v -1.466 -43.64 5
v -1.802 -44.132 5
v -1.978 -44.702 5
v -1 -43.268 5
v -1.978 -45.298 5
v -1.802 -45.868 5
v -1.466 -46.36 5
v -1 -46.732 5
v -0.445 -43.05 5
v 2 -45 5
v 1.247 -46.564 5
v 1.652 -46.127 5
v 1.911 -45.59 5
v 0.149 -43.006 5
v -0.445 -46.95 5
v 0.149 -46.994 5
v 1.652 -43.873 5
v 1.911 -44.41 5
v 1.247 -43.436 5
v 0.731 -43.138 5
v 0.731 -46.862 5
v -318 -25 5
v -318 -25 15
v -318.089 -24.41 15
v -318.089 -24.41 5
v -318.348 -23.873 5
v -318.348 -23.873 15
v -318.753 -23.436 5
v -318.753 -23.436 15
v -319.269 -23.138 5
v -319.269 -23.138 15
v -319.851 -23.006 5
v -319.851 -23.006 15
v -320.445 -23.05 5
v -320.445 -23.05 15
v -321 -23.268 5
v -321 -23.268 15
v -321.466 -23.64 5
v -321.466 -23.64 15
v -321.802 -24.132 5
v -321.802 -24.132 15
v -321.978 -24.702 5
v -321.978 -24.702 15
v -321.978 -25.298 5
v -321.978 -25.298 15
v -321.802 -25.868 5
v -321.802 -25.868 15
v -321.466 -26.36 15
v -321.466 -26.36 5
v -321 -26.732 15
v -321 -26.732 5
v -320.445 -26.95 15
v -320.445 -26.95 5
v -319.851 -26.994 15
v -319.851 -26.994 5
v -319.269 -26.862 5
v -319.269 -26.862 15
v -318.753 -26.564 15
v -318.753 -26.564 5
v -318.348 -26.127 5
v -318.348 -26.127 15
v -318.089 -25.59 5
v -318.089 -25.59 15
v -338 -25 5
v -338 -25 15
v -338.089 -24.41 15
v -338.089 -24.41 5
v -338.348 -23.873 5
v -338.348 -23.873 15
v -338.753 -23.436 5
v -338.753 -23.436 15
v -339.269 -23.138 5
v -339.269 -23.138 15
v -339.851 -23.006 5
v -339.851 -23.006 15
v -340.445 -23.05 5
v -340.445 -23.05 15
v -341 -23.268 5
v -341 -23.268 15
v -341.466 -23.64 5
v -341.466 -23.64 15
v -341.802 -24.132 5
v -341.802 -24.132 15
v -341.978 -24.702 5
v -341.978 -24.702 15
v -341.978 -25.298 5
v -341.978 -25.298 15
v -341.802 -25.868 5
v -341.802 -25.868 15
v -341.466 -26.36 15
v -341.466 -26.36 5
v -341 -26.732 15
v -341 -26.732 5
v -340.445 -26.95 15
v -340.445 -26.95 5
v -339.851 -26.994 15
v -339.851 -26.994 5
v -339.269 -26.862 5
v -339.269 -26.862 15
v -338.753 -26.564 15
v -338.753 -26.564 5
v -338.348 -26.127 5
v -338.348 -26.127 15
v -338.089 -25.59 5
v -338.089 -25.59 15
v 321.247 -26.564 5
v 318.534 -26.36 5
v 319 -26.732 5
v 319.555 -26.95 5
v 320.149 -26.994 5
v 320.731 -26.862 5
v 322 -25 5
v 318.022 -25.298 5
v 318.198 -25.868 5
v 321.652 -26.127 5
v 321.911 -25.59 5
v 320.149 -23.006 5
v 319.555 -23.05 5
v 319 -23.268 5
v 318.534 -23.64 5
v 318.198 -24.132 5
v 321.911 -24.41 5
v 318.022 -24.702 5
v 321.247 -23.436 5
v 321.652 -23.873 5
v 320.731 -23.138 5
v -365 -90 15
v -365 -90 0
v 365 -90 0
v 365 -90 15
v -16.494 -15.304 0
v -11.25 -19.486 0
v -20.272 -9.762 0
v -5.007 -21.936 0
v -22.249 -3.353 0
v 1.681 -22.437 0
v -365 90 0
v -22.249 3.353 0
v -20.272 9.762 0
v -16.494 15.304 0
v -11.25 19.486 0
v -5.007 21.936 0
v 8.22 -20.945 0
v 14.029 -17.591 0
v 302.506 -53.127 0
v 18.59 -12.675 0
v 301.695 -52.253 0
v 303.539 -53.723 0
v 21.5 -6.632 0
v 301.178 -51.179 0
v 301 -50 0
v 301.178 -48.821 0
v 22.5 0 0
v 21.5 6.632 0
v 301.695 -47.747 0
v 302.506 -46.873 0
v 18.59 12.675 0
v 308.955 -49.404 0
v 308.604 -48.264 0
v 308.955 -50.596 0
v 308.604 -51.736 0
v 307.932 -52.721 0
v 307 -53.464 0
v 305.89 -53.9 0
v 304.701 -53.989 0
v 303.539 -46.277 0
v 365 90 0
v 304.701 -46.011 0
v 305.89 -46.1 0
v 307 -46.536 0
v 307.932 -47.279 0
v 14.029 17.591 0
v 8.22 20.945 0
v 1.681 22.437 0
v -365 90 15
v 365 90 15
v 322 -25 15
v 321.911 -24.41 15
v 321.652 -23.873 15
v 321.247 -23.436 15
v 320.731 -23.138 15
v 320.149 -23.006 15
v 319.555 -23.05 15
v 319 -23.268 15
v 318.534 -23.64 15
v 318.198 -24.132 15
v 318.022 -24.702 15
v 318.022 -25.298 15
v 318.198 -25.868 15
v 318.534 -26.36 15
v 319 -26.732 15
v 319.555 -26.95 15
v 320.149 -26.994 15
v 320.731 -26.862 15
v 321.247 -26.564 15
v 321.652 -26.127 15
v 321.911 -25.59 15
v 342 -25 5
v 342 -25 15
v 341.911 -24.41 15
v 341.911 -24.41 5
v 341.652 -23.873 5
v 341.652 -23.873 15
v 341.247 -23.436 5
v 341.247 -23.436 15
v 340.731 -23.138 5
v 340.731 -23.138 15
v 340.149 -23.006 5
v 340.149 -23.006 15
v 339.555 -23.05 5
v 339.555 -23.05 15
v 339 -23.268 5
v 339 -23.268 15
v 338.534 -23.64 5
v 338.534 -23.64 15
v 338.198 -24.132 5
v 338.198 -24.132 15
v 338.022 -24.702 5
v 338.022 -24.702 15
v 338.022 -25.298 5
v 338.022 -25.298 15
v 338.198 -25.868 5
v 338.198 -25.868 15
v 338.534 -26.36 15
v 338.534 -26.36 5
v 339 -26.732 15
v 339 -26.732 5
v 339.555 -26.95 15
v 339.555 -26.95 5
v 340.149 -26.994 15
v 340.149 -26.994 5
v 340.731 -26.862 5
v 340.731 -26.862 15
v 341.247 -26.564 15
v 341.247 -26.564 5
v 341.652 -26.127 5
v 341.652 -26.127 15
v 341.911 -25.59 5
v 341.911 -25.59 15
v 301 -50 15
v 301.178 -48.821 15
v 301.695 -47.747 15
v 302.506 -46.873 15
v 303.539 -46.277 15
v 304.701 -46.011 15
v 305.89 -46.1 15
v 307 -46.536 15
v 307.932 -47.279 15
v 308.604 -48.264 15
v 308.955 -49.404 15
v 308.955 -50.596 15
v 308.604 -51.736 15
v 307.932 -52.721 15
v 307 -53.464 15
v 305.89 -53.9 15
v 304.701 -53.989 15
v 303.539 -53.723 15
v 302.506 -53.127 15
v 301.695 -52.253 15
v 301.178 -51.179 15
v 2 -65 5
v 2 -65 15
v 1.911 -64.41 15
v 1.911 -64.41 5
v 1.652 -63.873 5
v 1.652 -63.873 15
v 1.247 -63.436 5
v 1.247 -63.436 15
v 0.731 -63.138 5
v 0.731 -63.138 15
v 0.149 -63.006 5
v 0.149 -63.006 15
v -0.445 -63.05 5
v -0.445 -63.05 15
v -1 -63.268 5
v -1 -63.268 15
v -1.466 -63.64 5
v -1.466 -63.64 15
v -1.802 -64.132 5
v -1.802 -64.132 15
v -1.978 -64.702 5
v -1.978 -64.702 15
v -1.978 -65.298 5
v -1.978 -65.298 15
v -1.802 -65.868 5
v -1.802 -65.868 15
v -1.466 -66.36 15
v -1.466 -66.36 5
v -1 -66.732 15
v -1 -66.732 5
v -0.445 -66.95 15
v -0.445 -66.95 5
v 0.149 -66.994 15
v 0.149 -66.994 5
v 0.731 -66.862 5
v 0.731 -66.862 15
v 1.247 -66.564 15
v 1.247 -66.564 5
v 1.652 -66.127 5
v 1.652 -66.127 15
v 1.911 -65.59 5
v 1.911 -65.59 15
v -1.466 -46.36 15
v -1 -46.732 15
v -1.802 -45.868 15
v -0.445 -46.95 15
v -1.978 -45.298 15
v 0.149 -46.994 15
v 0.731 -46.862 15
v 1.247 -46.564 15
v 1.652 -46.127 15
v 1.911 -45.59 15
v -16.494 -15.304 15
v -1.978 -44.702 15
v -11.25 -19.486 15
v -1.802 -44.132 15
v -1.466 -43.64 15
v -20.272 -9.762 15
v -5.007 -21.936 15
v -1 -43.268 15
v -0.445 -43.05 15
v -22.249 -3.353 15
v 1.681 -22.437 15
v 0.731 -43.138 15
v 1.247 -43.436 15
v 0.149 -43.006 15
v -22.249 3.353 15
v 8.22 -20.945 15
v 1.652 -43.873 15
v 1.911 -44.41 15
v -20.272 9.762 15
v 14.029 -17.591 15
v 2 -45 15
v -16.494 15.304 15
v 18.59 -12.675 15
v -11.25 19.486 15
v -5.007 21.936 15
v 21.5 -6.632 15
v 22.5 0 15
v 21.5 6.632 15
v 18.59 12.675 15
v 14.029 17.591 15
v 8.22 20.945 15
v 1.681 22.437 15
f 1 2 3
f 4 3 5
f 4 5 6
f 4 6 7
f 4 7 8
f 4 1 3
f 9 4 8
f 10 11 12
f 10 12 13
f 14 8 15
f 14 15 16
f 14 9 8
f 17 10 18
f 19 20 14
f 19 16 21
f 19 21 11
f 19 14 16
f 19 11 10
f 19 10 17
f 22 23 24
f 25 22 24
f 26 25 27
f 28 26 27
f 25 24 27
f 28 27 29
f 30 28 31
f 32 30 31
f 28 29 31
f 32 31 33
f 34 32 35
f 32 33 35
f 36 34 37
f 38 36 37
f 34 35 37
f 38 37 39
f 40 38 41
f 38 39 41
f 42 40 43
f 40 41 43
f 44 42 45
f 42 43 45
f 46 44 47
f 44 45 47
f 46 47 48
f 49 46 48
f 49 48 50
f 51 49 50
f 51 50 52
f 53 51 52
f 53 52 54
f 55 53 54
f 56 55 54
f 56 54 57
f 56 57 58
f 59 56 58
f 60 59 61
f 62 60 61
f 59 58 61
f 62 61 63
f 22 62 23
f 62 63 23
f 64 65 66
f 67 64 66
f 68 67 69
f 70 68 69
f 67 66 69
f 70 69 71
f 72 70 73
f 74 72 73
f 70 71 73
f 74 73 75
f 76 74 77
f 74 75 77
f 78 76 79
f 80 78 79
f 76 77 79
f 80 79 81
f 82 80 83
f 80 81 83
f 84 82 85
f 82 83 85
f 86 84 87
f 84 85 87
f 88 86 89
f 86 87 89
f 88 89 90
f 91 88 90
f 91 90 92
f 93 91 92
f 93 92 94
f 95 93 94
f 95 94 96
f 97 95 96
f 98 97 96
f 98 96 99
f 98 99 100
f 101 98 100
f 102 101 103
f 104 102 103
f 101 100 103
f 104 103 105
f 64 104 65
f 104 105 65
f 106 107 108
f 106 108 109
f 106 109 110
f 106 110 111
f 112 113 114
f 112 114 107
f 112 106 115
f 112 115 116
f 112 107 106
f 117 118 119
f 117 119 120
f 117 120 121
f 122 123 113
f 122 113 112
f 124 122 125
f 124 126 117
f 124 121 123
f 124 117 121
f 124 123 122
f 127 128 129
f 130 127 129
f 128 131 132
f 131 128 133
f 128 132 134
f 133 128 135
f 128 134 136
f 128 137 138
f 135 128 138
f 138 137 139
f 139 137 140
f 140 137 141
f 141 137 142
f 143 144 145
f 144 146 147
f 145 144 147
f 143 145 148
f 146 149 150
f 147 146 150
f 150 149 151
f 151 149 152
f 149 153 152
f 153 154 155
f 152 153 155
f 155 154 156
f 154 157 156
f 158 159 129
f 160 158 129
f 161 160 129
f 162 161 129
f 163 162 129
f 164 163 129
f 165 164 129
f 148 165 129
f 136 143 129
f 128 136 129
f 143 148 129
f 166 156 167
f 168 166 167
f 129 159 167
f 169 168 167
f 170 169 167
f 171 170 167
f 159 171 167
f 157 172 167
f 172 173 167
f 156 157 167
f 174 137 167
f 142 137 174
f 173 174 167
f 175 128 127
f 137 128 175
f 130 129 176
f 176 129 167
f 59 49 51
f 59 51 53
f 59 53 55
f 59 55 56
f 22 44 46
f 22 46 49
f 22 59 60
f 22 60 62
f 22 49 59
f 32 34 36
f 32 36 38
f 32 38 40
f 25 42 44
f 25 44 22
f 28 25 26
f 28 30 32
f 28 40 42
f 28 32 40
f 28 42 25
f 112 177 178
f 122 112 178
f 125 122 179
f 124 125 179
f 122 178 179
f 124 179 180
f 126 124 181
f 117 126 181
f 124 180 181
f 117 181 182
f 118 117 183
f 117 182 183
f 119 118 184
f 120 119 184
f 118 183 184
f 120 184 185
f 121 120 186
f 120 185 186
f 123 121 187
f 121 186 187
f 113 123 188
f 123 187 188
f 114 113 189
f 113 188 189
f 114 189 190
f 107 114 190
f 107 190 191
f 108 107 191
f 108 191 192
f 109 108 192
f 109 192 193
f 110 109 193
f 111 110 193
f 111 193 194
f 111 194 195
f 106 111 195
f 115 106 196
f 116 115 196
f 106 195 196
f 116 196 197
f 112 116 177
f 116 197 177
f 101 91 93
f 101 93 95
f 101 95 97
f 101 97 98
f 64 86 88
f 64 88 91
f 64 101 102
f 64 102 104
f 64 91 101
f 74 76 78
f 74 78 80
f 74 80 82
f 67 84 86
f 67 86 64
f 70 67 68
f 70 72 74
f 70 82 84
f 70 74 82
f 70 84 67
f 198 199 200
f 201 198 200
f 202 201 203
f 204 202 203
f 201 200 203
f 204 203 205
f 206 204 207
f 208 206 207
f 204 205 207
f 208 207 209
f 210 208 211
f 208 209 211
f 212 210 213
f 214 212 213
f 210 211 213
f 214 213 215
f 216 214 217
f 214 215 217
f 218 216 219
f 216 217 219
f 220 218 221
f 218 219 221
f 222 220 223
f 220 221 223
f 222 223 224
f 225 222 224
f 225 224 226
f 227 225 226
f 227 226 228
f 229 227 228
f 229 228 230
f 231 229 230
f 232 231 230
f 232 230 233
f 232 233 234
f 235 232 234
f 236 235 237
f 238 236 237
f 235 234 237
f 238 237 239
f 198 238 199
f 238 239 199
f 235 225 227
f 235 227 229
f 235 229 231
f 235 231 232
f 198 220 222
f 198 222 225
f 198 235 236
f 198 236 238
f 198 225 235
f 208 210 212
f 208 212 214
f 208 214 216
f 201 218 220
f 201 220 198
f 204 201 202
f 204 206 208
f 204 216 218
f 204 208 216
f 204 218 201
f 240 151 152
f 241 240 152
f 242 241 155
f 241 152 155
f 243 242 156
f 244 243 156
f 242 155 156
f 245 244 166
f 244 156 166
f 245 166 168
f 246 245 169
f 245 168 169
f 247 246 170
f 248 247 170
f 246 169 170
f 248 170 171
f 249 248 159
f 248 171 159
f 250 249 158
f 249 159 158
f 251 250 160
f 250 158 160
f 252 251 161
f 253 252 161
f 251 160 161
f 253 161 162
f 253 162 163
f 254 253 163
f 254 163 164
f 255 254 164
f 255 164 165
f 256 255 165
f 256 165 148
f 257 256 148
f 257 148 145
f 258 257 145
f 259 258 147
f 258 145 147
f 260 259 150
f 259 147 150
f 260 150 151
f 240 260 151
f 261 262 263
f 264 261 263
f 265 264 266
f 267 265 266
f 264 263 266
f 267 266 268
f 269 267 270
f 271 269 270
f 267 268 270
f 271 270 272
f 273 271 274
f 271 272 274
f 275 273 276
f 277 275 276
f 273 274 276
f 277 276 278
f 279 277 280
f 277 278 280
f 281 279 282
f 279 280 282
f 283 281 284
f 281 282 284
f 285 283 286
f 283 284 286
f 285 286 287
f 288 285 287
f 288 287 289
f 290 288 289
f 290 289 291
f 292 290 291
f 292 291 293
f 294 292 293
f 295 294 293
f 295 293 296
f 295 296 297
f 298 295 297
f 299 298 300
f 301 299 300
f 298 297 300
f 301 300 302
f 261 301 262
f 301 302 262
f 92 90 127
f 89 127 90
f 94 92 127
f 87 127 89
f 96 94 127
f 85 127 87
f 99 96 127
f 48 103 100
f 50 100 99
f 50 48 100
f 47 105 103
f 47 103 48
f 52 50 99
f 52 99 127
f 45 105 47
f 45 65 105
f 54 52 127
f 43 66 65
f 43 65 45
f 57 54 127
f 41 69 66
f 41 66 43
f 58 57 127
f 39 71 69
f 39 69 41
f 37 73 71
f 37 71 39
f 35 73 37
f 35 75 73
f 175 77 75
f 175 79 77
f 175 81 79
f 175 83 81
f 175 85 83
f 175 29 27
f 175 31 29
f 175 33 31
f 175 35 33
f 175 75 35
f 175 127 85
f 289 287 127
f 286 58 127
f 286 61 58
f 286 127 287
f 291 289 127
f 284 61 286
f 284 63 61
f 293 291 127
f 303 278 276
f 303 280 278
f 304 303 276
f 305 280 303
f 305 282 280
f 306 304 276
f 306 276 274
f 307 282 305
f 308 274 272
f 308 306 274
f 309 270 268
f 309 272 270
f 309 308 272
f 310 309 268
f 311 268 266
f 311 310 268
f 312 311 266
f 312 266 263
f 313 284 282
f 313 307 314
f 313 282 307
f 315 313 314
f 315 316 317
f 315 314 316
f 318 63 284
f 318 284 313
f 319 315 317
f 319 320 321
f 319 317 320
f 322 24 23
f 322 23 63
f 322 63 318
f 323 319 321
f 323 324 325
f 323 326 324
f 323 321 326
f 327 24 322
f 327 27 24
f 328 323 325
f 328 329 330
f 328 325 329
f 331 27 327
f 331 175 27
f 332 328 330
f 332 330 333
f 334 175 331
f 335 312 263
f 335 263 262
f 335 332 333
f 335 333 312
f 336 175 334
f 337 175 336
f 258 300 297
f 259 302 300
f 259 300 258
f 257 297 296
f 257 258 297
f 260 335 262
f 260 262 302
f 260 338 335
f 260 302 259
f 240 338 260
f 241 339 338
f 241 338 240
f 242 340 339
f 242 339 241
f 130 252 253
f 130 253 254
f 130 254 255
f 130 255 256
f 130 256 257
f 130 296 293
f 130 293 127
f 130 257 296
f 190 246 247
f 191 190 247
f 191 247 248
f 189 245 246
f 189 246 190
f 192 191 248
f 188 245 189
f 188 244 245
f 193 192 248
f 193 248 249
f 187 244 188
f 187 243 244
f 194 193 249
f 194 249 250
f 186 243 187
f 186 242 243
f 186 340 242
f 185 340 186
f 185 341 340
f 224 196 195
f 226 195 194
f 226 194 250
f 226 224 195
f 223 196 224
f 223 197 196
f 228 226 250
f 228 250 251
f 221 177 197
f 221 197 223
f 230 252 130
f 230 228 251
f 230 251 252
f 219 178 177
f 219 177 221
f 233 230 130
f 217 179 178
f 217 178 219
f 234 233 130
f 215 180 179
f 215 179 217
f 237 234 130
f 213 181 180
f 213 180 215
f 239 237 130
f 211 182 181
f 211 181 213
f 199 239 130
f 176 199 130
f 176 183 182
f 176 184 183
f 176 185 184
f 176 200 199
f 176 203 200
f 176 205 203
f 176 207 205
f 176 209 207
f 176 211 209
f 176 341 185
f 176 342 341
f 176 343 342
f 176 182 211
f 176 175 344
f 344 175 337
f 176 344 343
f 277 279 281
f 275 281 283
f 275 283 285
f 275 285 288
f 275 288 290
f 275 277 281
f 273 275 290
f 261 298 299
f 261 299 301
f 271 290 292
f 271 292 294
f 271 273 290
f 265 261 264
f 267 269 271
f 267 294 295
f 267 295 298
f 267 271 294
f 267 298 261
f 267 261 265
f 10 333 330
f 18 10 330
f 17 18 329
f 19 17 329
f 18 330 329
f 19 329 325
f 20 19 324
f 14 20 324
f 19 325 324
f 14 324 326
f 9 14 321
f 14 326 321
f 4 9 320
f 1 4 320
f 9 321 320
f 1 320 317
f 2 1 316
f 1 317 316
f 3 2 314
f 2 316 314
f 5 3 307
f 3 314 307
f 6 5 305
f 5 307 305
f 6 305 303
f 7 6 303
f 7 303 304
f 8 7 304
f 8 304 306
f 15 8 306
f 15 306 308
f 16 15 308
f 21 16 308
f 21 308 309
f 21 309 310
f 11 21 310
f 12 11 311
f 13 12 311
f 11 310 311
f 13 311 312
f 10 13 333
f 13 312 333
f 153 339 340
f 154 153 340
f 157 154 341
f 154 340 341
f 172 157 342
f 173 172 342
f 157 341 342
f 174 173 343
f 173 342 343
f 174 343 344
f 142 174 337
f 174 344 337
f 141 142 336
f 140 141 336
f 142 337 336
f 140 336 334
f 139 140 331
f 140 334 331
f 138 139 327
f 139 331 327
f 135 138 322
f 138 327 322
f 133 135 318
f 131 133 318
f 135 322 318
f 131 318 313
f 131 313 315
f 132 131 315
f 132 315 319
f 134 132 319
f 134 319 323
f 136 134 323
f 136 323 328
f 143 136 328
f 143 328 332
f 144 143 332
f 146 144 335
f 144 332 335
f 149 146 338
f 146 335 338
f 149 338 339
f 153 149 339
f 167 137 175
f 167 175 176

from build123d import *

# Parameters (mm, degrees)
CROQUIS1_W              = 730
CROQUIS1_H              = 180
SALIENTE_EXTRUIR1_DEPTH = 15
CROQUIS2_R              = 2
CORTAR_EXTRUIR1_DEPTH   = 10
CROQUIS3_R              = 22.5
CORTAR_EXTRUIR2_DEPTH   = 15
CROQUIS4_R              = 4
CORTAR_EXTRUIR3_DEPTH   = 15


with BuildPart() as part:
    # Croquis1 → Saliente-Extruir1 (new body)
    with BuildSketch(Plane.XY):
        Rectangle(CROQUIS1_W, CROQUIS1_H)
    extrude(amount=SALIENTE_EXTRUIR1_DEPTH)

    # Croquis2 → Cortar-Extruir1 (cut)
    with BuildSketch(Plane.XY.offset(15)):
        with Locations((-340, -25)):
            Circle(CROQUIS2_R)
        with Locations((0, -65)):
            Circle(CROQUIS2_R)
        with Locations((0, -45)):
            Circle(CROQUIS2_R)
        with Locations((-320, -25)):
            Circle(CROQUIS2_R)
        with Locations((340, -25)):
            Circle(CROQUIS2_R)
        with Locations((320, -25)):
            Circle(CROQUIS2_R)
    extrude(amount=-CORTAR_EXTRUIR1_DEPTH, mode=Mode.SUBTRACT)

    # Croquis3 → Cortar-Extruir2 (cut)
    with BuildSketch(Plane.XY.offset(15)):
        Circle(CROQUIS3_R)
    extrude(amount=-CORTAR_EXTRUIR2_DEPTH, mode=Mode.SUBTRACT)

    # Croquis4 → Cortar-Extruir3 (cut)
    with BuildSketch(Plane(origin=(0, 0, 0), x_dir=(-1, 0, 0), z_dir=(0, 0, -1))):
        with Locations((-305, -50)):
            Circle(CROQUIS4_R)
    extrude(amount=-CORTAR_EXTRUIR3_DEPTH, mode=Mode.SUBTRACT)


solid = part.part
